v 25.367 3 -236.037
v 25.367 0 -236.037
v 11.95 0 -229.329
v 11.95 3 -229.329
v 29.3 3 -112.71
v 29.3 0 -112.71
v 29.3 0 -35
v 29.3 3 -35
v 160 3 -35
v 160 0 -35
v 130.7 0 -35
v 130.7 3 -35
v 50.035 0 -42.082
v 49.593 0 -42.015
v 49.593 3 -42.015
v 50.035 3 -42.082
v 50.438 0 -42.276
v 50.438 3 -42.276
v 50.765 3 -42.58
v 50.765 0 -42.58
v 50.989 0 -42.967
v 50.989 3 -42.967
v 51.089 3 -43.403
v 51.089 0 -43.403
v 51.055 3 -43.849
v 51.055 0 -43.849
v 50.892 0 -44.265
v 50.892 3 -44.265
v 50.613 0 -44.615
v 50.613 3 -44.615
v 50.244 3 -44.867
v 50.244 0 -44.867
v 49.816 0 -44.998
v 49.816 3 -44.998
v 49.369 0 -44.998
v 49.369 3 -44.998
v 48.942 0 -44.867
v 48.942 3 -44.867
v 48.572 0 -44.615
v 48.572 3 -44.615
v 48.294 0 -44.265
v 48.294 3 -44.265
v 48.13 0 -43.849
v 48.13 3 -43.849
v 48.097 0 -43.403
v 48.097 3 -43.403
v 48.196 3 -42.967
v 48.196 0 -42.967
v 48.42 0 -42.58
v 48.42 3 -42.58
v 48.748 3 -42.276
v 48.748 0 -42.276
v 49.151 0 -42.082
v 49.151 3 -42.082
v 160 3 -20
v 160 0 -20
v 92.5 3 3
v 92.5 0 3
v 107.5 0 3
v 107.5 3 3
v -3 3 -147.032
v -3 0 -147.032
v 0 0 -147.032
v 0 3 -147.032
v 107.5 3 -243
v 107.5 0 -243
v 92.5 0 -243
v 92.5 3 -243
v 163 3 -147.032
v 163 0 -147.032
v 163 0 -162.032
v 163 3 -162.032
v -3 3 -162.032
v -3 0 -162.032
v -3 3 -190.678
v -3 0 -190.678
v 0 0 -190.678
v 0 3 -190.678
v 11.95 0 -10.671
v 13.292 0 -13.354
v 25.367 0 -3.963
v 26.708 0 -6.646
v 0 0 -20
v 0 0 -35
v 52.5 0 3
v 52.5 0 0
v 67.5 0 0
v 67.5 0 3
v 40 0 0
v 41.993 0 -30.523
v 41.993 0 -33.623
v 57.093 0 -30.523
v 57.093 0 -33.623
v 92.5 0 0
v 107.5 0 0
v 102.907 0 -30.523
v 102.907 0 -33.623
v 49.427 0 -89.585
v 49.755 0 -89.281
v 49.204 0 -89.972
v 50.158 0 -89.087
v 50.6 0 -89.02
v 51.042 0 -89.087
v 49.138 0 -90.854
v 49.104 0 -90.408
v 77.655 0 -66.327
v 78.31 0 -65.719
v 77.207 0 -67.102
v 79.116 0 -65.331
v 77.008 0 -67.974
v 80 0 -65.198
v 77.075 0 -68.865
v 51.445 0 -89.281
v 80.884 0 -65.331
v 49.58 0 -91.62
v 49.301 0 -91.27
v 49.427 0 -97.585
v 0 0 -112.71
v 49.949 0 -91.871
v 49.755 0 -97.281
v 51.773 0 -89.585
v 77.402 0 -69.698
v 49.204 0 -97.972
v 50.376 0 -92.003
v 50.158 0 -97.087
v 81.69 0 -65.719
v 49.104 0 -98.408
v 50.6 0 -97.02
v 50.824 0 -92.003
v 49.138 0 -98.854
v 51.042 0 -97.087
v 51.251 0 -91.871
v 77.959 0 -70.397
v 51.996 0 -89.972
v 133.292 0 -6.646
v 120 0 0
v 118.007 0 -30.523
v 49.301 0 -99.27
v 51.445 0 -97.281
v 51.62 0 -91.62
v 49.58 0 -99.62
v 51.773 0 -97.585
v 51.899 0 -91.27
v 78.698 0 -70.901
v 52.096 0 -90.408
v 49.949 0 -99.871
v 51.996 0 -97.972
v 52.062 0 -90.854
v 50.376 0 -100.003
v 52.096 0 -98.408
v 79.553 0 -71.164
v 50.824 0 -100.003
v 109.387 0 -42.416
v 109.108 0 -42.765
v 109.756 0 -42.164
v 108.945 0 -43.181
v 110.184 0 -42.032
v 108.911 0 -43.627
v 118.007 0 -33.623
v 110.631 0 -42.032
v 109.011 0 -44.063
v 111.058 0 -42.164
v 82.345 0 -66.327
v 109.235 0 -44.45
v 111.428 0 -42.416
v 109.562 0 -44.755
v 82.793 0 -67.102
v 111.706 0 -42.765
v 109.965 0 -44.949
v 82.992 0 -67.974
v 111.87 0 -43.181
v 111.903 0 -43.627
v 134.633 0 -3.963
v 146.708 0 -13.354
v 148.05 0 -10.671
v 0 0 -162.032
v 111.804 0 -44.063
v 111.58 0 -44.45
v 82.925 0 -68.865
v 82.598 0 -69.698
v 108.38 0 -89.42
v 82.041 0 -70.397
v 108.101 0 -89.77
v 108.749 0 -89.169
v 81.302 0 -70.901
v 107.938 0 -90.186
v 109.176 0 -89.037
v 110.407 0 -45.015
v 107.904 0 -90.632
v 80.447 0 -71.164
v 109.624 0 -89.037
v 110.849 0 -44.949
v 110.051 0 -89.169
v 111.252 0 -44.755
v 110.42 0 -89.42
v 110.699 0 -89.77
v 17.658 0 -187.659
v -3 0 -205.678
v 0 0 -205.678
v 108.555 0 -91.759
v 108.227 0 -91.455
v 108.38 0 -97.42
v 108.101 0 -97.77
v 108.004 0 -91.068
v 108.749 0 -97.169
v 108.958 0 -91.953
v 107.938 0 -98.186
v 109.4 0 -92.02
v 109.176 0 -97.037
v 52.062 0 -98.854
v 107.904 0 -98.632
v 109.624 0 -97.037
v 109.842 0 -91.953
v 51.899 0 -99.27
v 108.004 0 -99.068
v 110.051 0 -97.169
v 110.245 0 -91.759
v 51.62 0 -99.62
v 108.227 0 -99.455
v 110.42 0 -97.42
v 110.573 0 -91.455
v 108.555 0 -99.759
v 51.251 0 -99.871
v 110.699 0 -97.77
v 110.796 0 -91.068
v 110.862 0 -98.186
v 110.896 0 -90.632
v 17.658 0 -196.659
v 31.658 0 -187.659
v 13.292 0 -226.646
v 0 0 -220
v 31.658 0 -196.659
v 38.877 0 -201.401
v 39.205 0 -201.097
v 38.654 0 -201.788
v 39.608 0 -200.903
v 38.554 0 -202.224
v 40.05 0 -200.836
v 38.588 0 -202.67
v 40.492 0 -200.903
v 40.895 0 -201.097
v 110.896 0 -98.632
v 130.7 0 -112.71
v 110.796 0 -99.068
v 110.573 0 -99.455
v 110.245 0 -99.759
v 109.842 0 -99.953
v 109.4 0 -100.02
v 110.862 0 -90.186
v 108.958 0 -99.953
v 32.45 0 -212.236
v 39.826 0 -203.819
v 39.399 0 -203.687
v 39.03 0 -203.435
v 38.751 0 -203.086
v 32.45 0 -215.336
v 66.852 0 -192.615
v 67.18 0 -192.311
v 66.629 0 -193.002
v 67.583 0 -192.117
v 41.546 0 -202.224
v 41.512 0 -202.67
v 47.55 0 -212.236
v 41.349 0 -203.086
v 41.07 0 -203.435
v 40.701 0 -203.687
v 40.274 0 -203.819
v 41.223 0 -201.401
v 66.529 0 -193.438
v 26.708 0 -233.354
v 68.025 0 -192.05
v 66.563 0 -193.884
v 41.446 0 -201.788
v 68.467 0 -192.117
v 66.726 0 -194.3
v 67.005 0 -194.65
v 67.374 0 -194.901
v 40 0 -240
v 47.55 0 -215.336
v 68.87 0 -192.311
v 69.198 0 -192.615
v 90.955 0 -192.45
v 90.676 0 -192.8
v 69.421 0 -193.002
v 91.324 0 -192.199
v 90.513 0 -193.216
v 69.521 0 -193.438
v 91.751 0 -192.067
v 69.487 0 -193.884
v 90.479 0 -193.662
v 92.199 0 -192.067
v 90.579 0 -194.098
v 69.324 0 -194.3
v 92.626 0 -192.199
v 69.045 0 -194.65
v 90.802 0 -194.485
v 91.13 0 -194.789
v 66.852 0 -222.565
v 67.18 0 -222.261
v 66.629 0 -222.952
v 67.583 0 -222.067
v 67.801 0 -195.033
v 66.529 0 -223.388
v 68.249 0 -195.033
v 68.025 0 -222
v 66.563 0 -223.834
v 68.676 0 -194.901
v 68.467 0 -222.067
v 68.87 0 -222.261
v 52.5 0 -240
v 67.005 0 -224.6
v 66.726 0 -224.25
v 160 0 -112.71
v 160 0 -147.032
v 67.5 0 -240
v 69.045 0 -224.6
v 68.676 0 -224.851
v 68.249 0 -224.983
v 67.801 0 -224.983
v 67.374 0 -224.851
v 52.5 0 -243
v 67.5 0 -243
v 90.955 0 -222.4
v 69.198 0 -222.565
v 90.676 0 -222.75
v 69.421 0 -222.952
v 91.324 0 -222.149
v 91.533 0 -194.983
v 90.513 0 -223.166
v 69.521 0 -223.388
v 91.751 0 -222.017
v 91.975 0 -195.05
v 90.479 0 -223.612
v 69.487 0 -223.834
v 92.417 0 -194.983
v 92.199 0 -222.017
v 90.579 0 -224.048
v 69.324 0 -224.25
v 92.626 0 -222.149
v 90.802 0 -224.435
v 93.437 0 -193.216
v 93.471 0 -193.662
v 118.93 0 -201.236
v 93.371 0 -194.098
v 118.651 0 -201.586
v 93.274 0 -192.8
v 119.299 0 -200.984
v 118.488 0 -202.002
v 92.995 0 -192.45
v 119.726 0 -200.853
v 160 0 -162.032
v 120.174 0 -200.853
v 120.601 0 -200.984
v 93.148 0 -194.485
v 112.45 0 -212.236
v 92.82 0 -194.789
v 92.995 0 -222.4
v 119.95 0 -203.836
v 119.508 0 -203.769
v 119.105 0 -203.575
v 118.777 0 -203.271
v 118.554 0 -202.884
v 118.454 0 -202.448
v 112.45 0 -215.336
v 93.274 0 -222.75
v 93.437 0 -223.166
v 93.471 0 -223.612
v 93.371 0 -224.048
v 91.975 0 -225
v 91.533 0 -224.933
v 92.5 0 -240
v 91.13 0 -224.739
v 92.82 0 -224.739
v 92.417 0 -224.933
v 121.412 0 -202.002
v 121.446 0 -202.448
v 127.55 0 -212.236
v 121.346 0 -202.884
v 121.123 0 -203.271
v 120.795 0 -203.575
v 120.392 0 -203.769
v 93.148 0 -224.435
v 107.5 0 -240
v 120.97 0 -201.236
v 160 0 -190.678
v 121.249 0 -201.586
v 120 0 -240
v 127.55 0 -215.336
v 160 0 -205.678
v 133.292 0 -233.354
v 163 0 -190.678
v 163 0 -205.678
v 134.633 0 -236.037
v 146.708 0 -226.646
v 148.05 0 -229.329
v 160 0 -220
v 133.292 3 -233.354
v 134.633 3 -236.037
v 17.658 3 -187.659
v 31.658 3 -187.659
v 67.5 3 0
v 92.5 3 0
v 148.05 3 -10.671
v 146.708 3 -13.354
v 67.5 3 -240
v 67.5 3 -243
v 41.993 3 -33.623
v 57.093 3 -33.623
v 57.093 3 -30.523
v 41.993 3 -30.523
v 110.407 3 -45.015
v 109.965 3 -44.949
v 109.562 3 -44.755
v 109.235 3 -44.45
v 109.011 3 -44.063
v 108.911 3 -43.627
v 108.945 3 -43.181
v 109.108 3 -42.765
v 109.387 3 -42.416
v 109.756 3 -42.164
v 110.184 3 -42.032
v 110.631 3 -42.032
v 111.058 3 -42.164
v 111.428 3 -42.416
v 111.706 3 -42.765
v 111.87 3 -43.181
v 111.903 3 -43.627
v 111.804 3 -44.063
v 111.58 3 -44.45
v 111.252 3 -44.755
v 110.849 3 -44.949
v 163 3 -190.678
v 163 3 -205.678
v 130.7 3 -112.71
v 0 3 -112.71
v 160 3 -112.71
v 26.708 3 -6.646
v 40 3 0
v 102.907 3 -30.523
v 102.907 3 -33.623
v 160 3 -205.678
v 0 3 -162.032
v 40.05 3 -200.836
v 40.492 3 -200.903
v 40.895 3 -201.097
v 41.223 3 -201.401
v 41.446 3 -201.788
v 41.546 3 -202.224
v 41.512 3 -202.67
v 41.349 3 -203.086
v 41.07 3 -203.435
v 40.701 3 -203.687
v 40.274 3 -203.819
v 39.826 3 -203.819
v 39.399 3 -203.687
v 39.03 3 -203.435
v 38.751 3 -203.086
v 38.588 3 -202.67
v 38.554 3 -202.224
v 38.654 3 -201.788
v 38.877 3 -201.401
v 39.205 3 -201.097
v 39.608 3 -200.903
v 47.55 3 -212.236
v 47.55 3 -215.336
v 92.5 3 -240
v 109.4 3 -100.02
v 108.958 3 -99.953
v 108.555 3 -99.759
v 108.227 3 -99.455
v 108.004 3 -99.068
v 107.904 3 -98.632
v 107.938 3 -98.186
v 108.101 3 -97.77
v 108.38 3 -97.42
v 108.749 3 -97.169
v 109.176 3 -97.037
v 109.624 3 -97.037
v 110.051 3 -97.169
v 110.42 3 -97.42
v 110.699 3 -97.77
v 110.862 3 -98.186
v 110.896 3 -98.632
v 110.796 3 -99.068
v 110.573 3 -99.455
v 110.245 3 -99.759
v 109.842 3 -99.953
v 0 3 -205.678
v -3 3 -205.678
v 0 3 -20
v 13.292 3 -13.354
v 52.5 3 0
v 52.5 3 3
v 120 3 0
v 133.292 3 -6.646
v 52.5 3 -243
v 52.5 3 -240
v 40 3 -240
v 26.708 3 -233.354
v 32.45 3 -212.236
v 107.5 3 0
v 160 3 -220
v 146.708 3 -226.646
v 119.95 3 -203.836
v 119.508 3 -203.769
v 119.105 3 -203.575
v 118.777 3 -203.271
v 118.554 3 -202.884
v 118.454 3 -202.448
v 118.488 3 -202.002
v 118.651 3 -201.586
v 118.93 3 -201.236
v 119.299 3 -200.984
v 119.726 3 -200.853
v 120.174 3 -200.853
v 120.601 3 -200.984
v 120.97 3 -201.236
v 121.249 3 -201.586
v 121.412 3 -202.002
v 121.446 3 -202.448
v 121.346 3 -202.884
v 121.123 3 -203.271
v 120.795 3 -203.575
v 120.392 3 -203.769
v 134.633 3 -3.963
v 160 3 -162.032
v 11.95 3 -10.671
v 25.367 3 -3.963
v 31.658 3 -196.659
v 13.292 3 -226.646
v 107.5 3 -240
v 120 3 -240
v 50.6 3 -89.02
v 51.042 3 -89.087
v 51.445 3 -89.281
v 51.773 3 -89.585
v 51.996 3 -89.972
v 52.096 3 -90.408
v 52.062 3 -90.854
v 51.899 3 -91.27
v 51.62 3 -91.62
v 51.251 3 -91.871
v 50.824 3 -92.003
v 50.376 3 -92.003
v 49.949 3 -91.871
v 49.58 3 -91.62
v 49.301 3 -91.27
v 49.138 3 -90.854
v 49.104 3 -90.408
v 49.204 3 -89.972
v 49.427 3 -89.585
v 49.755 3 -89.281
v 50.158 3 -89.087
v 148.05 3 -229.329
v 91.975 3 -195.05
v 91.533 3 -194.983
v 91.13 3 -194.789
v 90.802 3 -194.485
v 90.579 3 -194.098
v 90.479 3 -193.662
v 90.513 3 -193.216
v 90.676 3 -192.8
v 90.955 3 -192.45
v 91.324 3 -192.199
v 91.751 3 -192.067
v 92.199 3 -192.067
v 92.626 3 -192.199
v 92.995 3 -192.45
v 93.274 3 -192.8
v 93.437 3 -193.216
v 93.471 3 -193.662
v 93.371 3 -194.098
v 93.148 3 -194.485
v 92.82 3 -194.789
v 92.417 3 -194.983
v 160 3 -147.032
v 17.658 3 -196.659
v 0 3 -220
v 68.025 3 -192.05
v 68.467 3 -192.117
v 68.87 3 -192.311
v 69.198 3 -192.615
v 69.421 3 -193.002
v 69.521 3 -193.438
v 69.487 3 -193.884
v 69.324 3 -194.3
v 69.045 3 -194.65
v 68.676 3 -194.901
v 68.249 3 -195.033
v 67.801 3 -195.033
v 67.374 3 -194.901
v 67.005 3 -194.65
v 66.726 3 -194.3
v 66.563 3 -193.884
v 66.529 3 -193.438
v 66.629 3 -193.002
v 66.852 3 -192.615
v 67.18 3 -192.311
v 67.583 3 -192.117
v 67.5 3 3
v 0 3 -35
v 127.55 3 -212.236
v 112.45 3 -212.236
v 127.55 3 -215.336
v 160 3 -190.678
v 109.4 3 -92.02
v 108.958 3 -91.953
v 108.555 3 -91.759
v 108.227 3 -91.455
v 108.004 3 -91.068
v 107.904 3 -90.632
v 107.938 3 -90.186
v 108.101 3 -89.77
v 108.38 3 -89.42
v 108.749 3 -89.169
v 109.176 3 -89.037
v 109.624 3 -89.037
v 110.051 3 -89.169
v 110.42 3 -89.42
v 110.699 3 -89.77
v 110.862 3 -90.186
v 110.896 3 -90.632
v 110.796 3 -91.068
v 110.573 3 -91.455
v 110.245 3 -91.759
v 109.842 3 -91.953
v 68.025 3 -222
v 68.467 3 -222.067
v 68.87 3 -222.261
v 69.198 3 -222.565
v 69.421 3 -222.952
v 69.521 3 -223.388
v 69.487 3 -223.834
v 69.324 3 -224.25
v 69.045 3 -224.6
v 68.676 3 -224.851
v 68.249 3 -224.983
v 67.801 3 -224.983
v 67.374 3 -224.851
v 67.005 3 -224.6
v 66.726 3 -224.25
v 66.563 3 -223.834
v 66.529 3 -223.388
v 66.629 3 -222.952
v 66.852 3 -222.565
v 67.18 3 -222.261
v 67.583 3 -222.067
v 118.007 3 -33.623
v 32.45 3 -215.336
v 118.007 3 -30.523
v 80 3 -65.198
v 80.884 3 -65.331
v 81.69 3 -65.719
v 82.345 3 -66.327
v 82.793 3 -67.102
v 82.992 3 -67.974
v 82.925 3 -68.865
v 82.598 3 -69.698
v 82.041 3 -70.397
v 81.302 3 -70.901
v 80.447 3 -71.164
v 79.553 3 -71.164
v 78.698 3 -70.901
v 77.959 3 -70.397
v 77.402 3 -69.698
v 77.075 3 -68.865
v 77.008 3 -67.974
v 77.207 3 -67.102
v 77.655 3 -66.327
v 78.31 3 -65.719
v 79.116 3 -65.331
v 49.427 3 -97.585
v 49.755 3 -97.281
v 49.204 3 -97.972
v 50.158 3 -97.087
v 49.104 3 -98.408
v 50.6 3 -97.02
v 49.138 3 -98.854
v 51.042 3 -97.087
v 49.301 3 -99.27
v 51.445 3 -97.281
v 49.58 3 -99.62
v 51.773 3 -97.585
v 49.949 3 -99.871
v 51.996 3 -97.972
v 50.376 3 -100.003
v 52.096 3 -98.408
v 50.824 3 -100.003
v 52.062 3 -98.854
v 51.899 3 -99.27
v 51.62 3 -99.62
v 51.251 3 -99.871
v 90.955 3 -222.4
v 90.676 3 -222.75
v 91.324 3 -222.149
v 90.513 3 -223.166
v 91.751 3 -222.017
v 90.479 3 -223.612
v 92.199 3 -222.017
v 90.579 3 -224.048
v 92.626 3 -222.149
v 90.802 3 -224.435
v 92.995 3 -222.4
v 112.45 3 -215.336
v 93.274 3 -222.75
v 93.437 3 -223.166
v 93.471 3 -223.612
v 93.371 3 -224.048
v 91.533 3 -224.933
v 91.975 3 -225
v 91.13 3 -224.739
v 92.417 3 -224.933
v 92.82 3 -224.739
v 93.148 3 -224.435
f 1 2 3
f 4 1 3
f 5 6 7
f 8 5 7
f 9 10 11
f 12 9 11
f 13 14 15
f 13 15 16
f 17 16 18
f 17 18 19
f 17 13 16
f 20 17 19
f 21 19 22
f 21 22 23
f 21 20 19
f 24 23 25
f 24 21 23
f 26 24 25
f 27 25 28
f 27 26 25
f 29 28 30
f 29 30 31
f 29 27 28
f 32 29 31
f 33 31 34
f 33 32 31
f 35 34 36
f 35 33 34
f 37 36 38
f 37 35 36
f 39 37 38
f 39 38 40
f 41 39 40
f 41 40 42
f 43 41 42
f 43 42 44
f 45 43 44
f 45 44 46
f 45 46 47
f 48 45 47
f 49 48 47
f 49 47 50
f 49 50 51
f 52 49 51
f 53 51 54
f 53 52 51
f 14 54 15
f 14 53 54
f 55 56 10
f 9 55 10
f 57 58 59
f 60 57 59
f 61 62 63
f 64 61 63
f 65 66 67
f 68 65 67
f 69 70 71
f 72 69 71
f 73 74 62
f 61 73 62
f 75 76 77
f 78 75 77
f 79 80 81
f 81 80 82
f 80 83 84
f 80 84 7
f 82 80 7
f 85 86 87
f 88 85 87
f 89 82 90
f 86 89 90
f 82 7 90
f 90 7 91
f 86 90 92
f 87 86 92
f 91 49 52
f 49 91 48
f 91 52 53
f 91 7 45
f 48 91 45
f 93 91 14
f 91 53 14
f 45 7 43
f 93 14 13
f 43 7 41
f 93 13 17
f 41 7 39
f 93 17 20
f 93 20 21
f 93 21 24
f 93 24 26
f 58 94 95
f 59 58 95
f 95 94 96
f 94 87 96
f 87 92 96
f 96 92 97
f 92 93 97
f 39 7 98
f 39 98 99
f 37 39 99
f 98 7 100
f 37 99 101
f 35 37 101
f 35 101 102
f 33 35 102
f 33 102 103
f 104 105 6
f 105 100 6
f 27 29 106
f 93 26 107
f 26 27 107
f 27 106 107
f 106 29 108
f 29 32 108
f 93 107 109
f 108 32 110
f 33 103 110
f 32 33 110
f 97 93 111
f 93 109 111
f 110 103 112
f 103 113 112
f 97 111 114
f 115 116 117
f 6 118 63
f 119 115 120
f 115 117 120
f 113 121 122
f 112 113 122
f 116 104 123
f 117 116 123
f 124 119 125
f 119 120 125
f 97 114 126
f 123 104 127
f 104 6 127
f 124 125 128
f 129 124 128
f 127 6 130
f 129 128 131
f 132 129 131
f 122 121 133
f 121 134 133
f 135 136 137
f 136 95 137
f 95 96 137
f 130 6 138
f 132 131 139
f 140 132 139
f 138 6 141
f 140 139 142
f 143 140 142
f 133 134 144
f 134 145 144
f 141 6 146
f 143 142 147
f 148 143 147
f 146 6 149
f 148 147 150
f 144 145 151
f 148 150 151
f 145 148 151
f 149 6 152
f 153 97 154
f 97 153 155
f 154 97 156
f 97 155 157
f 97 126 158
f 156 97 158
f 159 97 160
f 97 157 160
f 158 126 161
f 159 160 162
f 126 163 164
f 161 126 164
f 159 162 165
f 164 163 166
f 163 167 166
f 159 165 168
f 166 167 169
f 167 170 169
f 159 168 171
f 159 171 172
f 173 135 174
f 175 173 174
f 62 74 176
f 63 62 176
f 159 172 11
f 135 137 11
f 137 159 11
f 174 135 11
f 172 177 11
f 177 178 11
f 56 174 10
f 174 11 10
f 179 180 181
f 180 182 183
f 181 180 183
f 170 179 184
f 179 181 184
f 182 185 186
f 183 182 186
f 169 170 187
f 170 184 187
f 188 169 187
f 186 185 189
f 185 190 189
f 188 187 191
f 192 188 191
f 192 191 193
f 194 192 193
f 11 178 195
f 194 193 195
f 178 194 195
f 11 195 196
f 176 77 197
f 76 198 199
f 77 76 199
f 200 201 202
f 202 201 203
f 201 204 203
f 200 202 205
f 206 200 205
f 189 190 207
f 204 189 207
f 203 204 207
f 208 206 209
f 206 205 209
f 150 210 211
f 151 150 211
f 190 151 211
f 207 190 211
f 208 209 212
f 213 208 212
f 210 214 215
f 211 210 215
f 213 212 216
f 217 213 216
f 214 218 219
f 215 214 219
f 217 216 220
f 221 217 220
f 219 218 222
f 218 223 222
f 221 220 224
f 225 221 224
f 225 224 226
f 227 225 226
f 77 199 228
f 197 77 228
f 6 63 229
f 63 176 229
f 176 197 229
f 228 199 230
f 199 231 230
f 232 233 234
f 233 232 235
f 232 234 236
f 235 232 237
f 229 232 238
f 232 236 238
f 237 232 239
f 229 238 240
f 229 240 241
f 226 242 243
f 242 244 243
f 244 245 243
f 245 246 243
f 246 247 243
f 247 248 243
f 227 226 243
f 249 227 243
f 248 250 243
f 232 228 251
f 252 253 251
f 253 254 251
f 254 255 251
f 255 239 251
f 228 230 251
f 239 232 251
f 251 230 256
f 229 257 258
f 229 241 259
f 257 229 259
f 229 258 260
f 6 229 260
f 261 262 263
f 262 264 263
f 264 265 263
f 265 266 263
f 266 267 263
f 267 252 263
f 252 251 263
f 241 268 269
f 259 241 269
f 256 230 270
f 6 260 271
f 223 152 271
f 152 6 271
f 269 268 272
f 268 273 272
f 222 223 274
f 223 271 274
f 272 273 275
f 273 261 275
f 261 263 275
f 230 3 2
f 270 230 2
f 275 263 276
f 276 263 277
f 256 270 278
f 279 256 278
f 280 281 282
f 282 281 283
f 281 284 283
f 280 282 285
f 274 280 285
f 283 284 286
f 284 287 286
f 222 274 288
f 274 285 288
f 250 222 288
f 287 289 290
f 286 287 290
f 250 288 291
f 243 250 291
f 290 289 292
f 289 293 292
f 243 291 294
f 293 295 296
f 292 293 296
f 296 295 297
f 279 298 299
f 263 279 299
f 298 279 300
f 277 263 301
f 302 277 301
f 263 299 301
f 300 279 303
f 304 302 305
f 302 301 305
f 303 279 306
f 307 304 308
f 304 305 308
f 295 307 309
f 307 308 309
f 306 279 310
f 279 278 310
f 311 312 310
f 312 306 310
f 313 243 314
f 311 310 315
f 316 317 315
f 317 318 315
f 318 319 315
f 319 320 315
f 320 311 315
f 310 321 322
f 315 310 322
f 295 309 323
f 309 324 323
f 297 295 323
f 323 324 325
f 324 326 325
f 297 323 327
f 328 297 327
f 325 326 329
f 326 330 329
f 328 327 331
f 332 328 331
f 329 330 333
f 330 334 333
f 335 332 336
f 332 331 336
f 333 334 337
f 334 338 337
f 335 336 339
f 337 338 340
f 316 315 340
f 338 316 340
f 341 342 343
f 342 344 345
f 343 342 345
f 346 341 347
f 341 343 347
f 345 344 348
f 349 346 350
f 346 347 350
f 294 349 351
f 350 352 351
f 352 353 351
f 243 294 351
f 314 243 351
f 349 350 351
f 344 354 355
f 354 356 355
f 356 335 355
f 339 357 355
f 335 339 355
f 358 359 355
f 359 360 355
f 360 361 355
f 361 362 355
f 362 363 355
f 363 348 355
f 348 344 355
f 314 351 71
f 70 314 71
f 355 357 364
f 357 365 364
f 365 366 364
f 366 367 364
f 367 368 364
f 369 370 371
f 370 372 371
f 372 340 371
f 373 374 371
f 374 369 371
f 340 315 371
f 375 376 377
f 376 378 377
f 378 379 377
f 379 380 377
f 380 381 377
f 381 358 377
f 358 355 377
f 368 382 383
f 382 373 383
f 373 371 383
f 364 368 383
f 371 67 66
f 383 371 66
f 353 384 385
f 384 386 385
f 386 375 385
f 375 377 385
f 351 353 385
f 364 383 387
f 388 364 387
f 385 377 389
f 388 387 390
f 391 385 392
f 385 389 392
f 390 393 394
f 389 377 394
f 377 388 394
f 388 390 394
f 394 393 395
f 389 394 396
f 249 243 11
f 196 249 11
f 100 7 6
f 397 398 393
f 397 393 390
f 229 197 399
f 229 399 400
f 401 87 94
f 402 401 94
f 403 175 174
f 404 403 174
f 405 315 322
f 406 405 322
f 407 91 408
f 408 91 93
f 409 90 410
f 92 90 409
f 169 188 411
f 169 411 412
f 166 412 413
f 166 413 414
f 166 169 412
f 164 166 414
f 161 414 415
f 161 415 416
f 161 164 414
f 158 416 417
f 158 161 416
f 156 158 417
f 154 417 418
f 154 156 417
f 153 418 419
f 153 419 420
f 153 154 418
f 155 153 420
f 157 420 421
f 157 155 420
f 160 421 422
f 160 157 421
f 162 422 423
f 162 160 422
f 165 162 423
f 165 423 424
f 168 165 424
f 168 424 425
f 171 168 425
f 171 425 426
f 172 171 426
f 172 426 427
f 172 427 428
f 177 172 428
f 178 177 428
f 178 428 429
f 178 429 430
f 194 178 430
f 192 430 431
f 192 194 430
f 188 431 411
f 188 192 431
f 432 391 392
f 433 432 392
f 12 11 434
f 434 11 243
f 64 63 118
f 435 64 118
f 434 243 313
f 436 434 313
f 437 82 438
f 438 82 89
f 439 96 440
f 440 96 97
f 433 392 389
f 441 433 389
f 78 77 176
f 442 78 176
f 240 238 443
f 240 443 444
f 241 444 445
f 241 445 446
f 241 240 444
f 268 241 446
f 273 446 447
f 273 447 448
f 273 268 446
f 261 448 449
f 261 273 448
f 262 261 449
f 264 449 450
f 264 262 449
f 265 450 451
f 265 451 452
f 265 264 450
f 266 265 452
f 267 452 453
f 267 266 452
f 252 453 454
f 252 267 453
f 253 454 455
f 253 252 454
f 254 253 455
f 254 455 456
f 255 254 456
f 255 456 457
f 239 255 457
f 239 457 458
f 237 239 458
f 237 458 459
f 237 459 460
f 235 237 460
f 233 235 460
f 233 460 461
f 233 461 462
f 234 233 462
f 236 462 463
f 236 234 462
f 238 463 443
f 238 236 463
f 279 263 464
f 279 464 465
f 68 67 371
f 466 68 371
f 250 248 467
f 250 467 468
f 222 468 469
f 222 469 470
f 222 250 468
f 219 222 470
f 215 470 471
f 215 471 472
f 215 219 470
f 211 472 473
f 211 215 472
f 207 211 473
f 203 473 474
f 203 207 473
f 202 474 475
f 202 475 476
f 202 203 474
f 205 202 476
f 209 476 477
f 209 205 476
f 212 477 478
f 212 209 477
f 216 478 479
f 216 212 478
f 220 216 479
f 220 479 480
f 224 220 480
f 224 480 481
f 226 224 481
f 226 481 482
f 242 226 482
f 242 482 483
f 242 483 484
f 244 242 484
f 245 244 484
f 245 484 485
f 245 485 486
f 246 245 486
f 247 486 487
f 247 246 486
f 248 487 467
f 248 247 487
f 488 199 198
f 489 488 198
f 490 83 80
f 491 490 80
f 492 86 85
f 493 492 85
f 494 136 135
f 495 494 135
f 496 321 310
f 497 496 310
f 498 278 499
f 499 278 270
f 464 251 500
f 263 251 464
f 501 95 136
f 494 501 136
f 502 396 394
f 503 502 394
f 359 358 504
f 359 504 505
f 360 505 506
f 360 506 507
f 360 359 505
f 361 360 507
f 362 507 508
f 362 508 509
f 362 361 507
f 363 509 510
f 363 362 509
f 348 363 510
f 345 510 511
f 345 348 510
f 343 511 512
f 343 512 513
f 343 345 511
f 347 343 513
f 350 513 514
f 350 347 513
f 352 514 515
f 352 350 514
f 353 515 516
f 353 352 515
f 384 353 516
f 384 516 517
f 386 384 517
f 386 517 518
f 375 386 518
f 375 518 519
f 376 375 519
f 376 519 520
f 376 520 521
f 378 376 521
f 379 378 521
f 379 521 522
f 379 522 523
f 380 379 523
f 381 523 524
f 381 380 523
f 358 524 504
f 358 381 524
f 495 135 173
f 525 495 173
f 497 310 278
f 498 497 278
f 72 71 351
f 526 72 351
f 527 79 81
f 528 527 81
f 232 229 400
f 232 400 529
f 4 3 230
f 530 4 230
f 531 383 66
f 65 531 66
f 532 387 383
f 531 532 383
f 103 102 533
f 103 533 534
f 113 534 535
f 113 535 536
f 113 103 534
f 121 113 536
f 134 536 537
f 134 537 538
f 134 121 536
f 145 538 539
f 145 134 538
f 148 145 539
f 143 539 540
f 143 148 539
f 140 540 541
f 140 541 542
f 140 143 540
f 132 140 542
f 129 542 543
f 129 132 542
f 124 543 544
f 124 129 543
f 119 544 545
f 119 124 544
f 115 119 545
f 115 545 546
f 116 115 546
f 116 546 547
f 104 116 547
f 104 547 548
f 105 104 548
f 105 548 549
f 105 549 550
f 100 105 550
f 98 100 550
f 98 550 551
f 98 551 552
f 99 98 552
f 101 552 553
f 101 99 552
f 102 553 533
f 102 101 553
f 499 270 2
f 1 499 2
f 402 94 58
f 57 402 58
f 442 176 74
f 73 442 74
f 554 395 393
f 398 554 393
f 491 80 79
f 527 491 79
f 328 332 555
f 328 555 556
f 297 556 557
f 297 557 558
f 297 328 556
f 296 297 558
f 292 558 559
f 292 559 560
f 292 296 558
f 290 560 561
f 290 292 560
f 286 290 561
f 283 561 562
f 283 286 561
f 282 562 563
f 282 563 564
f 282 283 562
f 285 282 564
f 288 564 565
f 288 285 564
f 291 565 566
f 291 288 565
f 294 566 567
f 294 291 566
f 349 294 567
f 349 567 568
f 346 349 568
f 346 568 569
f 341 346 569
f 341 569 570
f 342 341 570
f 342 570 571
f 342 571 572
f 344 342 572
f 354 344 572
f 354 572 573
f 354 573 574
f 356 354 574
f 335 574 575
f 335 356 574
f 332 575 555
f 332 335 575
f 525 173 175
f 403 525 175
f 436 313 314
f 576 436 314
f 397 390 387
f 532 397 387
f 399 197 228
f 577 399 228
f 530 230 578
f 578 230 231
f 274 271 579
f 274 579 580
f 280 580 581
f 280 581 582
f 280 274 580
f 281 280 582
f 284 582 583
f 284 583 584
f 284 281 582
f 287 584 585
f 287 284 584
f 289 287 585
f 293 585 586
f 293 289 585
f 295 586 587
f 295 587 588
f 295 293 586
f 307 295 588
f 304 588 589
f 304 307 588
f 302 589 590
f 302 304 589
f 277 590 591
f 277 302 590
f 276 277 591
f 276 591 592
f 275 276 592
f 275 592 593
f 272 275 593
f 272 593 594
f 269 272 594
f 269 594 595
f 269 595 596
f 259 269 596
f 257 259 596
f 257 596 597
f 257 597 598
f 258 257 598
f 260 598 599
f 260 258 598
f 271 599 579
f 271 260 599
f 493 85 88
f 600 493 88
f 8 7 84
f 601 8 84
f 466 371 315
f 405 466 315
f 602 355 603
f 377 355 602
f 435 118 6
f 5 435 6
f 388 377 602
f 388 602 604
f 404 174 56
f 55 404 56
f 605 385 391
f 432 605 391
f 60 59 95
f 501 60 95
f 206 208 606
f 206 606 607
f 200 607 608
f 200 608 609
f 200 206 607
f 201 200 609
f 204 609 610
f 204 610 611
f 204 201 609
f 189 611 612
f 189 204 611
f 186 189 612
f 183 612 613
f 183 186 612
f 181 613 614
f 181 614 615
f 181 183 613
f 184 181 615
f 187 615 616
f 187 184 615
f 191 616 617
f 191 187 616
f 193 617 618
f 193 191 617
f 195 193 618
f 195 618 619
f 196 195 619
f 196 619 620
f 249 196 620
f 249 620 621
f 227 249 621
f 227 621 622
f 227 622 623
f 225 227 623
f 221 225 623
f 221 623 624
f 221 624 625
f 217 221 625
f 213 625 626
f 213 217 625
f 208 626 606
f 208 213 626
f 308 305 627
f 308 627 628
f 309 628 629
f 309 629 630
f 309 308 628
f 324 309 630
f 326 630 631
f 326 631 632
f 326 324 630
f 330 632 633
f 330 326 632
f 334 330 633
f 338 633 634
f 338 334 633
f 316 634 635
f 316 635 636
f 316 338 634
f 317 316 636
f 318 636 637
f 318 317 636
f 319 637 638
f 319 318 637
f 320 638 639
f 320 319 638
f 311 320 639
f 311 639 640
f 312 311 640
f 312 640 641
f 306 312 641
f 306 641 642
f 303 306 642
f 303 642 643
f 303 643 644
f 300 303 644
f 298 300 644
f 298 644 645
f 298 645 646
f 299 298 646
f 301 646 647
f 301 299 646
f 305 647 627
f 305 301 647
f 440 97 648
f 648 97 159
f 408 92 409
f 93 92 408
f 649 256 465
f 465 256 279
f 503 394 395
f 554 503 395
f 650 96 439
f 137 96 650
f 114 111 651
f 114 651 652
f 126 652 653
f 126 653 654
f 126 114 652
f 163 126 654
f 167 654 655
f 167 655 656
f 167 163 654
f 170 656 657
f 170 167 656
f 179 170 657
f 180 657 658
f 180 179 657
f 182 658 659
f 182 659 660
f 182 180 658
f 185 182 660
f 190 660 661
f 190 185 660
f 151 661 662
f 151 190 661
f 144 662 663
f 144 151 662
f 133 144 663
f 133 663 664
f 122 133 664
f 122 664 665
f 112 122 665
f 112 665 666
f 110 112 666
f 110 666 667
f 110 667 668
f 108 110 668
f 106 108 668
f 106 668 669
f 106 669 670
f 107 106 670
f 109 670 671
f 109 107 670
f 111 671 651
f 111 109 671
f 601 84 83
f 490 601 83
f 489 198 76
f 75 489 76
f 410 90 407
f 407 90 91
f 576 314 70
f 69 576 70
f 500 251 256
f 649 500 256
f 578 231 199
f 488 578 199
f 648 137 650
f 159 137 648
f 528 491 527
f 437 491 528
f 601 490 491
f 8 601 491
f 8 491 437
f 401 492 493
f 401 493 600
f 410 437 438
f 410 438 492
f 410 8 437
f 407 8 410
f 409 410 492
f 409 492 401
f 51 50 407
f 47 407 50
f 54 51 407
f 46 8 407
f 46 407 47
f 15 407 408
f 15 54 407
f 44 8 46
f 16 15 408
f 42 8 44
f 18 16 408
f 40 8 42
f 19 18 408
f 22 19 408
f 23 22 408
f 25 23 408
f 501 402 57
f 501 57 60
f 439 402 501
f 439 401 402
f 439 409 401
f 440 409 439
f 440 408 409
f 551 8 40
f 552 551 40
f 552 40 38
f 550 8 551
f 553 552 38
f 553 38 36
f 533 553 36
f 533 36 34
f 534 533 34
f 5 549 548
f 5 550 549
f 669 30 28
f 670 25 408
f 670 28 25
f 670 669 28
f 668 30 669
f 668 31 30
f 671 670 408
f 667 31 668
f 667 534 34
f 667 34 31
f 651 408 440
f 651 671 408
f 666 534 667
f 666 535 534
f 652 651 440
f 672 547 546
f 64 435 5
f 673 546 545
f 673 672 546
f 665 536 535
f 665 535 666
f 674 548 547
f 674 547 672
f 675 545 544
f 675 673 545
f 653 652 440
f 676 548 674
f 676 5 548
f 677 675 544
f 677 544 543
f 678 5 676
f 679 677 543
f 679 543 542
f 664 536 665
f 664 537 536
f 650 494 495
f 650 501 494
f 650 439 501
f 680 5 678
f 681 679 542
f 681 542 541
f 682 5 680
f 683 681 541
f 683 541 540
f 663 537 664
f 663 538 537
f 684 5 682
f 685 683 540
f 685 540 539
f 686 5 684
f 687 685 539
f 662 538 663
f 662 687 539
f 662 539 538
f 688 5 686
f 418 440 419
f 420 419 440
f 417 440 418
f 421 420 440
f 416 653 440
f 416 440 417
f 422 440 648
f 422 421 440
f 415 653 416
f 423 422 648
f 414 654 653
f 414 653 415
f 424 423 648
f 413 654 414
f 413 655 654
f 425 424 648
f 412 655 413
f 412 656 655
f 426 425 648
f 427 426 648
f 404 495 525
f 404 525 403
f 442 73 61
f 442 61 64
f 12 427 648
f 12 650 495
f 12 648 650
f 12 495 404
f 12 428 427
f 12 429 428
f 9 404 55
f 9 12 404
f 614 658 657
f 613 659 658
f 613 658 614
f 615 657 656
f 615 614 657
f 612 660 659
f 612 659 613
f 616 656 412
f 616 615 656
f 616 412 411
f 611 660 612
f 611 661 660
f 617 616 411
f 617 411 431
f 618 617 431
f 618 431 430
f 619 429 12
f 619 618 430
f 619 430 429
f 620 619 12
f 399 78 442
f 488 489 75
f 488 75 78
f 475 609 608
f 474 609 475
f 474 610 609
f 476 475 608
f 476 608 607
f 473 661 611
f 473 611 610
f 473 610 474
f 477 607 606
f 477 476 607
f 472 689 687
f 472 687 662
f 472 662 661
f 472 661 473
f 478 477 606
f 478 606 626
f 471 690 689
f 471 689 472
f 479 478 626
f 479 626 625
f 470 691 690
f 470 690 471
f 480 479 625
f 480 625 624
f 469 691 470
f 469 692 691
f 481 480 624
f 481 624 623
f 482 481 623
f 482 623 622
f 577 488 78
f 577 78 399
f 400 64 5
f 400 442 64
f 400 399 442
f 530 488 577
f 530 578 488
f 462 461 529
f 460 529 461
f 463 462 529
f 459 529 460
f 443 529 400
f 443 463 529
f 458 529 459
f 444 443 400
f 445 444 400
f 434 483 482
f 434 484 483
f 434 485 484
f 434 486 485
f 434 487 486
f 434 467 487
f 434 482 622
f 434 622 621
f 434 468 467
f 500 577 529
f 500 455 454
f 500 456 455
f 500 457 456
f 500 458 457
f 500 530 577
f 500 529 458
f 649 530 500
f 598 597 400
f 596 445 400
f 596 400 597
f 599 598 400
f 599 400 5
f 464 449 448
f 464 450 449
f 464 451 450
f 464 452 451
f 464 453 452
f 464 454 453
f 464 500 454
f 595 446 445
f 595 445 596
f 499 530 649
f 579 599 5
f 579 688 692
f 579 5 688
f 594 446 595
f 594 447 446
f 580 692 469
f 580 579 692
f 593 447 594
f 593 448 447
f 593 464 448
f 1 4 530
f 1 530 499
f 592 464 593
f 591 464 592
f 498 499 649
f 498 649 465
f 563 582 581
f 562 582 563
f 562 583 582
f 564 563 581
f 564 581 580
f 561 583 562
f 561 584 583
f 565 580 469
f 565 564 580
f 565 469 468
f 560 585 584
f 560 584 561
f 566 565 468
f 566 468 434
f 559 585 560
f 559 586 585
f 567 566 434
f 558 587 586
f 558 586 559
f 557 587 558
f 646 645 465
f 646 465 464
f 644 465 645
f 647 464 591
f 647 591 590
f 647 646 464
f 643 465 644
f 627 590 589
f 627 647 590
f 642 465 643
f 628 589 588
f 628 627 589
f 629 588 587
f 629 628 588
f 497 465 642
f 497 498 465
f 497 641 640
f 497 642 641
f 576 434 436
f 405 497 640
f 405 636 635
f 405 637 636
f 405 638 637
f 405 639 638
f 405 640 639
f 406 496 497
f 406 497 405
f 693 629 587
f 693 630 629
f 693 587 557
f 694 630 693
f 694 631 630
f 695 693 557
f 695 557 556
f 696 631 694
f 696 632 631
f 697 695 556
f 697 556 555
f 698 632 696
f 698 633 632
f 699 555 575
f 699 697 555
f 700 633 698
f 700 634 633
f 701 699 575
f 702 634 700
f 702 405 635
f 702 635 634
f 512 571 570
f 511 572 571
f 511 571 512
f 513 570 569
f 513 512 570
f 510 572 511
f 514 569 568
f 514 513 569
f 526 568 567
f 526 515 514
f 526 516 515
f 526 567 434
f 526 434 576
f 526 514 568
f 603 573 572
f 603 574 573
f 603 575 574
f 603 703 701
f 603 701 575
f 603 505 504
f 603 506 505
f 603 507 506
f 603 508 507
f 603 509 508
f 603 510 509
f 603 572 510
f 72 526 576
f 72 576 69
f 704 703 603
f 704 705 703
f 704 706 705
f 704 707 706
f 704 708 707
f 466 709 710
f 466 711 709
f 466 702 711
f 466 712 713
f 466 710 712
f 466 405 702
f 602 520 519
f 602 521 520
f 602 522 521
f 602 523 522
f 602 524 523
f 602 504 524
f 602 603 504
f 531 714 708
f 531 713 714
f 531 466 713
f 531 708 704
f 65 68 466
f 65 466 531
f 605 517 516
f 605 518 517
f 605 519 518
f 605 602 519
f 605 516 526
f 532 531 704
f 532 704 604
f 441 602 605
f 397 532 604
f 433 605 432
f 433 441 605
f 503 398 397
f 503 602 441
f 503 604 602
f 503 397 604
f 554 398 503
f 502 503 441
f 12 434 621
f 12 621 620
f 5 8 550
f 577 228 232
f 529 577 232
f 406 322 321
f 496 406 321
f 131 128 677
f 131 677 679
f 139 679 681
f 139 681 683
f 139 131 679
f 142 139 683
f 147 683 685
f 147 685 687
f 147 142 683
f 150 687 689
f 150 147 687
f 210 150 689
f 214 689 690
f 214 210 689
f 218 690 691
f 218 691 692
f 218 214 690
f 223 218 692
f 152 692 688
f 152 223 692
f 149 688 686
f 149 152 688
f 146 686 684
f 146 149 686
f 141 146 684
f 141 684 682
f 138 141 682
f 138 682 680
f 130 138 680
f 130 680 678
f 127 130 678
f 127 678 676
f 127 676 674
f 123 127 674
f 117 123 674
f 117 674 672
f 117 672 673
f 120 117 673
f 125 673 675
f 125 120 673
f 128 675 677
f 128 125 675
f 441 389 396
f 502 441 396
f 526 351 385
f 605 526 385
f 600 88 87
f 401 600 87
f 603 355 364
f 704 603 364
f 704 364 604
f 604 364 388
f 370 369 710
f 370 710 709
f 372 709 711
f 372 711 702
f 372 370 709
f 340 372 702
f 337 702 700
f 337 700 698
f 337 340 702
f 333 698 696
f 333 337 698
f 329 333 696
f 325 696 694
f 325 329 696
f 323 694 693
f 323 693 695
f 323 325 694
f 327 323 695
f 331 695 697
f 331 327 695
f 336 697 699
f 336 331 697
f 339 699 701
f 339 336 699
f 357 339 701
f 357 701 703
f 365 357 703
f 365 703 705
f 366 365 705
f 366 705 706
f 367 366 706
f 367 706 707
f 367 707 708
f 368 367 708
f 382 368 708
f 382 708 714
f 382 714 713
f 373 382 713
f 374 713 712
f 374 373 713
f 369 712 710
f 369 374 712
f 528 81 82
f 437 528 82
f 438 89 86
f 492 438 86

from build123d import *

# Parameters (mm, degrees)
SKETCH1_R           = 1.5
SKETCH1_R_2         = 3
SKETCH1_W           = 15.1
SKETCH1_H           = 3.1
SKETCH1_W_2         = 14
SKETCH1_H_2         = 9
BOSS_EXTRUDE1_DEPTH = 3


with BuildPart() as part:
    # Sketch1 → Boss-Extrude1 (new body)
    with BuildSketch(Plane(origin=(0, 0, 0), x_dir=(1, 0, 0), z_dir=(0, 1, 0))):
        Polygon((120, 0), (133.291796068, 6.645898034), (134.633436854, 3.962616461), (148.049844719, 10.670820393), (146.708203932, 13.354101966), (160, 20), (160, 35), (130.7, 35), (130.7, 112.71), (160, 112.71), (160, 147.0325), (163, 147.0325), (163, 162.0325), (160, 162.0325), (160, 190.6775), (163, 190.6775), (163, 205.6775), (160, 205.6775), (160, 220), (146.708203932, 226.645898034), (148.049844719, 229.329179607), (134.633436854, 236.037383539), (133.291796068, 233.354101966), (120, 240), (107.5, 240), (107.5, 243), (92.5, 243), (92.5, 240), (67.5, 240), (67.5, 243), (52.5, 243), (52.5, 240), (40, 240), (26.708203932, 233.354101966), (25.366563146, 236.037383539), (11.950155281, 229.329179607), (13.291796068, 226.645898034), (0, 220), (0, 205.6775), (-3, 205.6775), (-3, 190.6775), (0, 190.6775), (0, 162.0325), (-3, 162.0325), (-3, 147.0325), (0, 147.0325), (0, 112.71), (29.3, 112.71), (29.3, 35), (0, 35), (0, 20), (13.291796068, 13.354101966), (11.950155281, 10.670820393), (25.366563146, 3.962616461), (26.708203932, 6.645898034), (40, 0), (52.5, 0), (52.5, -3), (67.5, -3), (67.5, 0), (92.5, 0), (92.5, -3), (107.5, -3), (107.5, 0), align=None)
        with Locations(Location((50.6, 98.52, 0), (0, 0, 270))):
            Circle(SKETCH1_R, mode=Mode.SUBTRACT)
        with Locations(Location((50.6, 90.52, 0), (0, 0, 270))):
            Circle(SKETCH1_R, mode=Mode.SUBTRACT)
        with Locations(Location((68.025, 223.5, 0), (0, 0, 270))):
            Circle(SKETCH1_R, mode=Mode.SUBTRACT)
        with Locations(Location((68.025, 193.55, 0), (0, 0, 270))):
            Circle(SKETCH1_R, mode=Mode.SUBTRACT)
        with Locations(Location((91.975, 193.55, 0), (0, 0, 90))):
            Circle(SKETCH1_R, mode=Mode.SUBTRACT)
        with Locations(Location((91.975, 223.5, 0), (0, 0, 90))):
            Circle(SKETCH1_R, mode=Mode.SUBTRACT)
        with Locations(Location((109.4, 90.52, 0), (0, 0, 90))):
            Circle(SKETCH1_R, mode=Mode.SUBTRACT)
        with Locations(Location((109.4, 98.52, 0), (0, 0, 90))):
            Circle(SKETCH1_R, mode=Mode.SUBTRACT)
        with Locations(Location((40.05, 202.335880608, 0), (0, 0, 270))):
            Circle(SKETCH1_R, mode=Mode.SUBTRACT)
        with Locations(Location((49.592731594, 43.515235673, 0), (0, 0, 270))):
            Circle(SKETCH1_R, mode=Mode.SUBTRACT)
        with Locations(Location((110.407268406, 43.515235673, 0), (0, 0, 90))):
            Circle(SKETCH1_R, mode=Mode.SUBTRACT)
        with Locations(Location((119.95, 202.335880608, 0), (0, 0, 90))):
            Circle(SKETCH1_R, mode=Mode.SUBTRACT)
        with Locations(Location((80, 68.197866296, 0), (0, 0, 270))):
            Circle(SKETCH1_R_2, mode=Mode.SUBTRACT)
        with Locations((40, 213.785880608)):
            Rectangle(SKETCH1_W, SKETCH1_H, mode=Mode.SUBTRACT)
        with Locations((49.542731594, 32.073098627)):
            Rectangle(SKETCH1_W, SKETCH1_H, mode=Mode.SUBTRACT)
        with Locations((120, 213.785880608)):
            Rectangle(SKETCH1_W, SKETCH1_H, mode=Mode.SUBTRACT)
        with Locations((110.457268406, 32.073098627)):
            Rectangle(SKETCH1_W, SKETCH1_H, mode=Mode.SUBTRACT)
        with Locations((24.658359214, 192.159143415)):
            Rectangle(SKETCH1_W_2, SKETCH1_H_2, mode=Mode.SUBTRACT)
    extrude(amount=BOSS_EXTRUDE1_DEPTH)


solid = part.part
